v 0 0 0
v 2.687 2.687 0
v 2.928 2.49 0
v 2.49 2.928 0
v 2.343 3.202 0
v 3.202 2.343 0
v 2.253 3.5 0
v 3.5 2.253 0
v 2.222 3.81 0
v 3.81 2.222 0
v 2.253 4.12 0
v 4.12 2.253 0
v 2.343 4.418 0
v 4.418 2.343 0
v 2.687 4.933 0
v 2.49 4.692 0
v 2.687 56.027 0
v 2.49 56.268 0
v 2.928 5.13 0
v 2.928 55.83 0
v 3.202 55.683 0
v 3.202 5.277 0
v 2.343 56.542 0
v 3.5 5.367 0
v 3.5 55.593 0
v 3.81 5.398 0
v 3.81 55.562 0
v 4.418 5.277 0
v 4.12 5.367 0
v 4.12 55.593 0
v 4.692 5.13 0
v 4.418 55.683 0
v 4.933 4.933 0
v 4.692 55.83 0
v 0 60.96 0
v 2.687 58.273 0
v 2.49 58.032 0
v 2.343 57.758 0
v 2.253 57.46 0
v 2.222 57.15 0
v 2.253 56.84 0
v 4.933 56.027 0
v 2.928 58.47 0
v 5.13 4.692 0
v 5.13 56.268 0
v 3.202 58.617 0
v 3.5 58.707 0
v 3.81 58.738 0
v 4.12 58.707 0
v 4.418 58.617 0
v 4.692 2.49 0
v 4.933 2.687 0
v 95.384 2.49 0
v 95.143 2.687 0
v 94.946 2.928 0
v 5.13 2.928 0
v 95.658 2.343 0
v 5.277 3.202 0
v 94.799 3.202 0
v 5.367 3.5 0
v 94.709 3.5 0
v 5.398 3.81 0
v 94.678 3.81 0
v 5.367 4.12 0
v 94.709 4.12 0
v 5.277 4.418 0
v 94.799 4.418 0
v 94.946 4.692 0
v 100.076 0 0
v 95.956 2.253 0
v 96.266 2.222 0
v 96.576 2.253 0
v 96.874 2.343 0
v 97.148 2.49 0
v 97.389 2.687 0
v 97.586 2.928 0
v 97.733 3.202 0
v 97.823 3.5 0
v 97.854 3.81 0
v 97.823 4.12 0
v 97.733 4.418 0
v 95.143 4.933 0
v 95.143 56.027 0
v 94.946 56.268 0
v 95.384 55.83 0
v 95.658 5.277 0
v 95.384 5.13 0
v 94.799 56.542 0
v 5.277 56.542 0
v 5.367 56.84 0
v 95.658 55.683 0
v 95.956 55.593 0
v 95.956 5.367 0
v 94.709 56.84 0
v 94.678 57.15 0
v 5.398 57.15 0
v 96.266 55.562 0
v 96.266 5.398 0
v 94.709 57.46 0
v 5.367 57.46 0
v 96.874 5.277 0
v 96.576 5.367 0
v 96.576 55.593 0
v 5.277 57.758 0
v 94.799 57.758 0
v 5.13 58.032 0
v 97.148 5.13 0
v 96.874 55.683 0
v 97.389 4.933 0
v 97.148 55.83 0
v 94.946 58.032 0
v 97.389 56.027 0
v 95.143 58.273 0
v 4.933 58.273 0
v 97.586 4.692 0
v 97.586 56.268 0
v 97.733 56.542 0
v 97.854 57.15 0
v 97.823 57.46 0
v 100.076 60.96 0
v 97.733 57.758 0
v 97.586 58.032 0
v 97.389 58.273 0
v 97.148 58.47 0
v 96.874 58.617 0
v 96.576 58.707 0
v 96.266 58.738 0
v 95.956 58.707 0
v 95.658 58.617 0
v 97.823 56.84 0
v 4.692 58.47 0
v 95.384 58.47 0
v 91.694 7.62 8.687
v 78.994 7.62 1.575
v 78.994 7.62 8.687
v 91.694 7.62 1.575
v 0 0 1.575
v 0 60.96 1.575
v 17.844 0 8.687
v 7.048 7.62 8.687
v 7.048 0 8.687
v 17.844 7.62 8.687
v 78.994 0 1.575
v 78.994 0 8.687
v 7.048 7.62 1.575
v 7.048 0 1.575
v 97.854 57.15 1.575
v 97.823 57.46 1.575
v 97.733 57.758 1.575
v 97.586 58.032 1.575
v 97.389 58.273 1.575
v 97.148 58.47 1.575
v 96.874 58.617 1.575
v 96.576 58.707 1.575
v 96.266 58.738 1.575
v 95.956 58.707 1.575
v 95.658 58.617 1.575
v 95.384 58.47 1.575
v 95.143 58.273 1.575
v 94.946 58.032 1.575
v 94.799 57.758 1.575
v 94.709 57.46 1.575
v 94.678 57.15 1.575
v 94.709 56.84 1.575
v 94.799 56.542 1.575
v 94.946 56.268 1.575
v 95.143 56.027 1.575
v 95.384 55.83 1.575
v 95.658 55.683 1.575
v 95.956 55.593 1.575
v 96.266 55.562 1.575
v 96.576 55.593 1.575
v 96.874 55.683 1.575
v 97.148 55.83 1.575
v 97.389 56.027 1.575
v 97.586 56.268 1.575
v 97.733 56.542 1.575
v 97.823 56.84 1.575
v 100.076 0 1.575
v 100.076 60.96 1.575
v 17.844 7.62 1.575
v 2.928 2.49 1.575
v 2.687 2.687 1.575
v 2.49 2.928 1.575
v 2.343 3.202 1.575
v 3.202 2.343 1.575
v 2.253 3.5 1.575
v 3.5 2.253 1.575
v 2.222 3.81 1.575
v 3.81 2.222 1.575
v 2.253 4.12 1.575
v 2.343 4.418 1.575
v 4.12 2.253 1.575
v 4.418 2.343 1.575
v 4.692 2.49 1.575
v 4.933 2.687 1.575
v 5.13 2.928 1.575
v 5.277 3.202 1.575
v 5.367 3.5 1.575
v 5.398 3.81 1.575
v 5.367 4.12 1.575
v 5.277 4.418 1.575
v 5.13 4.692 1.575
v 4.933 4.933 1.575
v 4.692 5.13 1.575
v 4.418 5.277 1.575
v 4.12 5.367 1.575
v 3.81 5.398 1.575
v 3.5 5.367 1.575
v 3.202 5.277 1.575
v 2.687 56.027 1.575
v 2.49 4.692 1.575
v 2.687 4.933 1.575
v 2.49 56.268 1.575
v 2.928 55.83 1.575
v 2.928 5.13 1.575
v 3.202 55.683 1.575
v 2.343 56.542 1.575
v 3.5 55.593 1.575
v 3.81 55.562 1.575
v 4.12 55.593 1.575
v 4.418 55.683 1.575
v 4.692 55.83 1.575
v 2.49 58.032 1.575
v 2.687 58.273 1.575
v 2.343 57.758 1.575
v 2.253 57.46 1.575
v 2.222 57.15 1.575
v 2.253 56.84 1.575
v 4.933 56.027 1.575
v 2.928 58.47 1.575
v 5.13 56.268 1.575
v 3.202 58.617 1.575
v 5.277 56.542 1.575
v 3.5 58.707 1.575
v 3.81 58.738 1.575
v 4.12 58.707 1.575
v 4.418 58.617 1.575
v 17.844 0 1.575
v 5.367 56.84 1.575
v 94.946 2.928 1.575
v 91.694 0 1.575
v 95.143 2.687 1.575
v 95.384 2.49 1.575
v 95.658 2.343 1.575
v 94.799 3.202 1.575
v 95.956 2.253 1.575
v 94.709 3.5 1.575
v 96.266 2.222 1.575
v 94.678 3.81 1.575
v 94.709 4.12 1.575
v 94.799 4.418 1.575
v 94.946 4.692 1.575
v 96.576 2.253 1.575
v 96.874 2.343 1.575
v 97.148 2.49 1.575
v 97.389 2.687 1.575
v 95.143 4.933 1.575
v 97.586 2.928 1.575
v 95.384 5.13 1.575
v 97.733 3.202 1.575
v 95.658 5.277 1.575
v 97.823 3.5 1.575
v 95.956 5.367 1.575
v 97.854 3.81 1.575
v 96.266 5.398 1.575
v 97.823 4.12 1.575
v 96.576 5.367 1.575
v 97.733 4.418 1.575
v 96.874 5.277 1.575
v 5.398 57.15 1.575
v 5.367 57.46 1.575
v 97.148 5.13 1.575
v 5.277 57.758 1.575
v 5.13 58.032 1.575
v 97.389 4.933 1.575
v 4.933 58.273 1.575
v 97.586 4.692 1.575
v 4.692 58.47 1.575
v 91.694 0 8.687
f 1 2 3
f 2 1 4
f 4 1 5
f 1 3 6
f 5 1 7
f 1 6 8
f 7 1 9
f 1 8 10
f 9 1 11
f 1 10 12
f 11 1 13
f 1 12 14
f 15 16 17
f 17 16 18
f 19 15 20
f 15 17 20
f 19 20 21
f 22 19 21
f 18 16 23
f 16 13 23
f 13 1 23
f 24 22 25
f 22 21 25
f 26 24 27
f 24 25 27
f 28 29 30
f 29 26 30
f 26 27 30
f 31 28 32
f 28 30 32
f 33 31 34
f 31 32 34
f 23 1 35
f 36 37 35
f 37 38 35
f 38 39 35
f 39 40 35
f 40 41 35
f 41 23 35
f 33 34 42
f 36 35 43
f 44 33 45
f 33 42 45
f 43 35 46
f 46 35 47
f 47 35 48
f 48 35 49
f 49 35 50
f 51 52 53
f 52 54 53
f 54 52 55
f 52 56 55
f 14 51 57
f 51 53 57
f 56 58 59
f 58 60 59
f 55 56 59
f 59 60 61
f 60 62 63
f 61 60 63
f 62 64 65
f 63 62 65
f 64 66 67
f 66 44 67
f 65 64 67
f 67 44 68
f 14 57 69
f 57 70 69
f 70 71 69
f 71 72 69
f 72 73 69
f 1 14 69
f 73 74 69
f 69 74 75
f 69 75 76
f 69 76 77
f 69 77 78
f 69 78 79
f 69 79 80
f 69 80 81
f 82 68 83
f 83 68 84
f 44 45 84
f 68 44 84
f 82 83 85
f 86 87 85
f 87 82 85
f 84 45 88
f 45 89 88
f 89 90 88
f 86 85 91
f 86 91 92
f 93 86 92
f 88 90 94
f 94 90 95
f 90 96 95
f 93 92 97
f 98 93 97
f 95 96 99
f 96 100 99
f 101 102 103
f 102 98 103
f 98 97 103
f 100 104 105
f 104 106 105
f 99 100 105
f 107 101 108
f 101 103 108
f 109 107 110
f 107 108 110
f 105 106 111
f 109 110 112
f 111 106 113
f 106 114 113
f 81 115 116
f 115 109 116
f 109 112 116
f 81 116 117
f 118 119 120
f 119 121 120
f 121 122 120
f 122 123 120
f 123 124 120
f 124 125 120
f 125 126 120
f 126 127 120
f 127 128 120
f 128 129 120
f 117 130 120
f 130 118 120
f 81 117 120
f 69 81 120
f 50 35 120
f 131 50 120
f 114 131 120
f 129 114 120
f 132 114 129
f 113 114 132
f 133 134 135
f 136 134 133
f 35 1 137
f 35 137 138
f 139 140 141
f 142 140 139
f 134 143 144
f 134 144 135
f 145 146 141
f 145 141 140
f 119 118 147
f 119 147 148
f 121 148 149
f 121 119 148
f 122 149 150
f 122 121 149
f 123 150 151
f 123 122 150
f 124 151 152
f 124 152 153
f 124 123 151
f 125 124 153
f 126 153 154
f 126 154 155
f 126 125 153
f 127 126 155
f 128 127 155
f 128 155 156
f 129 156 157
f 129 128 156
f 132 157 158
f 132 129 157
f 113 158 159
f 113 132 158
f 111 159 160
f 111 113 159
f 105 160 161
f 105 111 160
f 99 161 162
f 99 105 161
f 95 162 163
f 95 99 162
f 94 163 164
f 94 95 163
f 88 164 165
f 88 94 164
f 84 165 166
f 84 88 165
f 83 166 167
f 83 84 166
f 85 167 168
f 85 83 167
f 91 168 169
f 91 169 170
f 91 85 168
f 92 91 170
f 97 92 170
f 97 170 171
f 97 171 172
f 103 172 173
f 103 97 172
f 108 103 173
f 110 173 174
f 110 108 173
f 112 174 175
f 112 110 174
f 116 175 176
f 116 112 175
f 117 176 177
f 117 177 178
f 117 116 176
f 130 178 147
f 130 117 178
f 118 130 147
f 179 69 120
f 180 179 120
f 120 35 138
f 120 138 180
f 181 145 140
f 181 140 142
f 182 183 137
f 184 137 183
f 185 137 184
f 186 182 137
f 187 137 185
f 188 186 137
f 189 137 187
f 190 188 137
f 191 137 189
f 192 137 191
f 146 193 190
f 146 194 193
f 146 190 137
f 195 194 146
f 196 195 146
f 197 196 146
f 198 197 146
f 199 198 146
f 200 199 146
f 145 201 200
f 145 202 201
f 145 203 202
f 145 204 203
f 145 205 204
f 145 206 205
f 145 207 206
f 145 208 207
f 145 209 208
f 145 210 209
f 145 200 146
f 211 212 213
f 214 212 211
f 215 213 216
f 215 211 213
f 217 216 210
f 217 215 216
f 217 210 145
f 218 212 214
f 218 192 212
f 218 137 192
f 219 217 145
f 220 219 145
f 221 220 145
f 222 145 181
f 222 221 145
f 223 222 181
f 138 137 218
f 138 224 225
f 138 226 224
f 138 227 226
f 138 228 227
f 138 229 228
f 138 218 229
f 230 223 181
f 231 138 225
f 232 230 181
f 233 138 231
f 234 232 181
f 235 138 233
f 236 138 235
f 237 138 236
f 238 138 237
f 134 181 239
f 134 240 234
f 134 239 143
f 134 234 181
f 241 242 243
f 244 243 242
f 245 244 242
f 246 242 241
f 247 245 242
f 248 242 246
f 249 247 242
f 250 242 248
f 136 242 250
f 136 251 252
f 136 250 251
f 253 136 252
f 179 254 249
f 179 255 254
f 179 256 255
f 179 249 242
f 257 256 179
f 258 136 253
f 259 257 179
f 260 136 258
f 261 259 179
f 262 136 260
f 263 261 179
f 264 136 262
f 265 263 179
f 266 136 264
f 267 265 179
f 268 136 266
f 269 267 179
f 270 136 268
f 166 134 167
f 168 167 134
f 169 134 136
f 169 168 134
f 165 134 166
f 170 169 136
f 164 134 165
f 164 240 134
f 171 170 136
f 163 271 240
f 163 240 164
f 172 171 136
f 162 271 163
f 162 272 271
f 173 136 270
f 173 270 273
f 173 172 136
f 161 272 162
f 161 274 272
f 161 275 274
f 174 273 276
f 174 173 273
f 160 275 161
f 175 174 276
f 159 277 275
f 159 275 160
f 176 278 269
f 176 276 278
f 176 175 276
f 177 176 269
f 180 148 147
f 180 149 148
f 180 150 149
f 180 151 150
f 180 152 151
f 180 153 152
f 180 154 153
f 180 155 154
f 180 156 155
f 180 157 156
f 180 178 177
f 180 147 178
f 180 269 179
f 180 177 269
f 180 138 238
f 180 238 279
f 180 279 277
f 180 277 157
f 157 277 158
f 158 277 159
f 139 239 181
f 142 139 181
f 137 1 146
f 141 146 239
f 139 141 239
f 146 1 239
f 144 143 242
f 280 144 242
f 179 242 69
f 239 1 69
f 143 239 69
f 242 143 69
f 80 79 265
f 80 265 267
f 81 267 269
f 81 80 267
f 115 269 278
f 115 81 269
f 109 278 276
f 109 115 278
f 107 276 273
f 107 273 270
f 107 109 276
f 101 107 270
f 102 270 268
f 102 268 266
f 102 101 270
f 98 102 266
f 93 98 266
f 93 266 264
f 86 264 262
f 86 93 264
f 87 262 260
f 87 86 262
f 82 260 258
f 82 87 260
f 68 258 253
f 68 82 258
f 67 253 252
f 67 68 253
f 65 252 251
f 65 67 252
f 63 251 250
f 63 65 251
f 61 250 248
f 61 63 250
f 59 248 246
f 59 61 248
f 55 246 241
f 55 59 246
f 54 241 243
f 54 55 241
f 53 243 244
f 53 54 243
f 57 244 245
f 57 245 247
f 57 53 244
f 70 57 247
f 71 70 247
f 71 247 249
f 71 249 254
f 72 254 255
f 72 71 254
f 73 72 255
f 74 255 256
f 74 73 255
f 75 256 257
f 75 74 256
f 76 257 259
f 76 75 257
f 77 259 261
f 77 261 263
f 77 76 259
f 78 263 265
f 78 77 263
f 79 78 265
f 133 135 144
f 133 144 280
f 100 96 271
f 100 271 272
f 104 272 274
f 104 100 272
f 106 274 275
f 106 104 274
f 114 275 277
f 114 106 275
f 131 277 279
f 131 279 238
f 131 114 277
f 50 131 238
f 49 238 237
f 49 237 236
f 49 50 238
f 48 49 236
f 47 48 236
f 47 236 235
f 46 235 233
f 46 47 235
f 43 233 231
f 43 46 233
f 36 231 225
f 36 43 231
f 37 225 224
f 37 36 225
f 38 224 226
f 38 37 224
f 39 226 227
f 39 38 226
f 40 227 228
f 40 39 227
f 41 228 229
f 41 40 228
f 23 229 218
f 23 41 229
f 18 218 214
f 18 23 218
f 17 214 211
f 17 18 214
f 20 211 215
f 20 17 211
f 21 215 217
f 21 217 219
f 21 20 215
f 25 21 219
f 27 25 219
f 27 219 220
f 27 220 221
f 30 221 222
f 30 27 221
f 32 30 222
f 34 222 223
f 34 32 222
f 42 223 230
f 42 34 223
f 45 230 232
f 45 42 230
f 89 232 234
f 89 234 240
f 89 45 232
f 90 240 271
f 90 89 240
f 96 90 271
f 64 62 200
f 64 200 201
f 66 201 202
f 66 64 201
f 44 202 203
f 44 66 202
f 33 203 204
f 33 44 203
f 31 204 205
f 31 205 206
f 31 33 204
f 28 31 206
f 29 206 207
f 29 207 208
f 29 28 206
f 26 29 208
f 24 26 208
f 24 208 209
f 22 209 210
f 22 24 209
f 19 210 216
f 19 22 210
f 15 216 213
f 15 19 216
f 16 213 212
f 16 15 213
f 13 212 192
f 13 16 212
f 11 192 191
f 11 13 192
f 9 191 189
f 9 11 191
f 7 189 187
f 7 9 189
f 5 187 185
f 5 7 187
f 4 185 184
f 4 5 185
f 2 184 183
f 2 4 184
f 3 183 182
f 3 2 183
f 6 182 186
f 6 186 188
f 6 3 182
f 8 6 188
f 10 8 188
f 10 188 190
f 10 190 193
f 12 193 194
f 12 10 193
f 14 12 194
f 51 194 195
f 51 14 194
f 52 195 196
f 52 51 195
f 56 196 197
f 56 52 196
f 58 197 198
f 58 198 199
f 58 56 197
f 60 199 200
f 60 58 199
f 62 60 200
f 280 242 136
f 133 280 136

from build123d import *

# Parameters (mm, degrees)
SKETCH1_W           = 100.076
SKETCH1_H           = 60.96
SKETCH1_R           = 1.5875
BOSS_EXTRUDE1_DEPTH = 1.5748
SKETCH2_W           = 10.795
SKETCH2_H           = 7.62
SKETCH2_W_2         = 12.7
BOSS_EXTRUDE2_DEPTH = 7.112


with BuildPart() as part:
    # Sketch1 → Boss-Extrude1 (new body)
    with BuildSketch(Plane.XY):
        with Locations((50.038, 30.48)):
            Rectangle(SKETCH1_W, SKETCH1_H)
        with Locations((3.81, 57.15)):
            Circle(SKETCH1_R, mode=Mode.SUBTRACT)
        with Locations((96.266, 57.15)):
            Circle(SKETCH1_R, mode=Mode.SUBTRACT)
        with Locations((96.266, 3.81)):
            Circle(SKETCH1_R, mode=Mode.SUBTRACT)
        with Locations((3.81, 3.81)):
            Circle(SKETCH1_R, mode=Mode.SUBTRACT)
    extrude(amount=BOSS_EXTRUDE1_DEPTH)

    # Sketch2 → Boss-Extrude2 (add)
    with BuildSketch(Plane.XY.offset(1.5748)):
        with Locations((12.446, 3.81)):
            Rectangle(SKETCH2_W, SKETCH2_H)
        with Locations((85.344, 3.81)):
            Rectangle(SKETCH2_W_2, SKETCH2_H)
    extrude(amount=BOSS_EXTRUDE2_DEPTH)


solid = part.part
